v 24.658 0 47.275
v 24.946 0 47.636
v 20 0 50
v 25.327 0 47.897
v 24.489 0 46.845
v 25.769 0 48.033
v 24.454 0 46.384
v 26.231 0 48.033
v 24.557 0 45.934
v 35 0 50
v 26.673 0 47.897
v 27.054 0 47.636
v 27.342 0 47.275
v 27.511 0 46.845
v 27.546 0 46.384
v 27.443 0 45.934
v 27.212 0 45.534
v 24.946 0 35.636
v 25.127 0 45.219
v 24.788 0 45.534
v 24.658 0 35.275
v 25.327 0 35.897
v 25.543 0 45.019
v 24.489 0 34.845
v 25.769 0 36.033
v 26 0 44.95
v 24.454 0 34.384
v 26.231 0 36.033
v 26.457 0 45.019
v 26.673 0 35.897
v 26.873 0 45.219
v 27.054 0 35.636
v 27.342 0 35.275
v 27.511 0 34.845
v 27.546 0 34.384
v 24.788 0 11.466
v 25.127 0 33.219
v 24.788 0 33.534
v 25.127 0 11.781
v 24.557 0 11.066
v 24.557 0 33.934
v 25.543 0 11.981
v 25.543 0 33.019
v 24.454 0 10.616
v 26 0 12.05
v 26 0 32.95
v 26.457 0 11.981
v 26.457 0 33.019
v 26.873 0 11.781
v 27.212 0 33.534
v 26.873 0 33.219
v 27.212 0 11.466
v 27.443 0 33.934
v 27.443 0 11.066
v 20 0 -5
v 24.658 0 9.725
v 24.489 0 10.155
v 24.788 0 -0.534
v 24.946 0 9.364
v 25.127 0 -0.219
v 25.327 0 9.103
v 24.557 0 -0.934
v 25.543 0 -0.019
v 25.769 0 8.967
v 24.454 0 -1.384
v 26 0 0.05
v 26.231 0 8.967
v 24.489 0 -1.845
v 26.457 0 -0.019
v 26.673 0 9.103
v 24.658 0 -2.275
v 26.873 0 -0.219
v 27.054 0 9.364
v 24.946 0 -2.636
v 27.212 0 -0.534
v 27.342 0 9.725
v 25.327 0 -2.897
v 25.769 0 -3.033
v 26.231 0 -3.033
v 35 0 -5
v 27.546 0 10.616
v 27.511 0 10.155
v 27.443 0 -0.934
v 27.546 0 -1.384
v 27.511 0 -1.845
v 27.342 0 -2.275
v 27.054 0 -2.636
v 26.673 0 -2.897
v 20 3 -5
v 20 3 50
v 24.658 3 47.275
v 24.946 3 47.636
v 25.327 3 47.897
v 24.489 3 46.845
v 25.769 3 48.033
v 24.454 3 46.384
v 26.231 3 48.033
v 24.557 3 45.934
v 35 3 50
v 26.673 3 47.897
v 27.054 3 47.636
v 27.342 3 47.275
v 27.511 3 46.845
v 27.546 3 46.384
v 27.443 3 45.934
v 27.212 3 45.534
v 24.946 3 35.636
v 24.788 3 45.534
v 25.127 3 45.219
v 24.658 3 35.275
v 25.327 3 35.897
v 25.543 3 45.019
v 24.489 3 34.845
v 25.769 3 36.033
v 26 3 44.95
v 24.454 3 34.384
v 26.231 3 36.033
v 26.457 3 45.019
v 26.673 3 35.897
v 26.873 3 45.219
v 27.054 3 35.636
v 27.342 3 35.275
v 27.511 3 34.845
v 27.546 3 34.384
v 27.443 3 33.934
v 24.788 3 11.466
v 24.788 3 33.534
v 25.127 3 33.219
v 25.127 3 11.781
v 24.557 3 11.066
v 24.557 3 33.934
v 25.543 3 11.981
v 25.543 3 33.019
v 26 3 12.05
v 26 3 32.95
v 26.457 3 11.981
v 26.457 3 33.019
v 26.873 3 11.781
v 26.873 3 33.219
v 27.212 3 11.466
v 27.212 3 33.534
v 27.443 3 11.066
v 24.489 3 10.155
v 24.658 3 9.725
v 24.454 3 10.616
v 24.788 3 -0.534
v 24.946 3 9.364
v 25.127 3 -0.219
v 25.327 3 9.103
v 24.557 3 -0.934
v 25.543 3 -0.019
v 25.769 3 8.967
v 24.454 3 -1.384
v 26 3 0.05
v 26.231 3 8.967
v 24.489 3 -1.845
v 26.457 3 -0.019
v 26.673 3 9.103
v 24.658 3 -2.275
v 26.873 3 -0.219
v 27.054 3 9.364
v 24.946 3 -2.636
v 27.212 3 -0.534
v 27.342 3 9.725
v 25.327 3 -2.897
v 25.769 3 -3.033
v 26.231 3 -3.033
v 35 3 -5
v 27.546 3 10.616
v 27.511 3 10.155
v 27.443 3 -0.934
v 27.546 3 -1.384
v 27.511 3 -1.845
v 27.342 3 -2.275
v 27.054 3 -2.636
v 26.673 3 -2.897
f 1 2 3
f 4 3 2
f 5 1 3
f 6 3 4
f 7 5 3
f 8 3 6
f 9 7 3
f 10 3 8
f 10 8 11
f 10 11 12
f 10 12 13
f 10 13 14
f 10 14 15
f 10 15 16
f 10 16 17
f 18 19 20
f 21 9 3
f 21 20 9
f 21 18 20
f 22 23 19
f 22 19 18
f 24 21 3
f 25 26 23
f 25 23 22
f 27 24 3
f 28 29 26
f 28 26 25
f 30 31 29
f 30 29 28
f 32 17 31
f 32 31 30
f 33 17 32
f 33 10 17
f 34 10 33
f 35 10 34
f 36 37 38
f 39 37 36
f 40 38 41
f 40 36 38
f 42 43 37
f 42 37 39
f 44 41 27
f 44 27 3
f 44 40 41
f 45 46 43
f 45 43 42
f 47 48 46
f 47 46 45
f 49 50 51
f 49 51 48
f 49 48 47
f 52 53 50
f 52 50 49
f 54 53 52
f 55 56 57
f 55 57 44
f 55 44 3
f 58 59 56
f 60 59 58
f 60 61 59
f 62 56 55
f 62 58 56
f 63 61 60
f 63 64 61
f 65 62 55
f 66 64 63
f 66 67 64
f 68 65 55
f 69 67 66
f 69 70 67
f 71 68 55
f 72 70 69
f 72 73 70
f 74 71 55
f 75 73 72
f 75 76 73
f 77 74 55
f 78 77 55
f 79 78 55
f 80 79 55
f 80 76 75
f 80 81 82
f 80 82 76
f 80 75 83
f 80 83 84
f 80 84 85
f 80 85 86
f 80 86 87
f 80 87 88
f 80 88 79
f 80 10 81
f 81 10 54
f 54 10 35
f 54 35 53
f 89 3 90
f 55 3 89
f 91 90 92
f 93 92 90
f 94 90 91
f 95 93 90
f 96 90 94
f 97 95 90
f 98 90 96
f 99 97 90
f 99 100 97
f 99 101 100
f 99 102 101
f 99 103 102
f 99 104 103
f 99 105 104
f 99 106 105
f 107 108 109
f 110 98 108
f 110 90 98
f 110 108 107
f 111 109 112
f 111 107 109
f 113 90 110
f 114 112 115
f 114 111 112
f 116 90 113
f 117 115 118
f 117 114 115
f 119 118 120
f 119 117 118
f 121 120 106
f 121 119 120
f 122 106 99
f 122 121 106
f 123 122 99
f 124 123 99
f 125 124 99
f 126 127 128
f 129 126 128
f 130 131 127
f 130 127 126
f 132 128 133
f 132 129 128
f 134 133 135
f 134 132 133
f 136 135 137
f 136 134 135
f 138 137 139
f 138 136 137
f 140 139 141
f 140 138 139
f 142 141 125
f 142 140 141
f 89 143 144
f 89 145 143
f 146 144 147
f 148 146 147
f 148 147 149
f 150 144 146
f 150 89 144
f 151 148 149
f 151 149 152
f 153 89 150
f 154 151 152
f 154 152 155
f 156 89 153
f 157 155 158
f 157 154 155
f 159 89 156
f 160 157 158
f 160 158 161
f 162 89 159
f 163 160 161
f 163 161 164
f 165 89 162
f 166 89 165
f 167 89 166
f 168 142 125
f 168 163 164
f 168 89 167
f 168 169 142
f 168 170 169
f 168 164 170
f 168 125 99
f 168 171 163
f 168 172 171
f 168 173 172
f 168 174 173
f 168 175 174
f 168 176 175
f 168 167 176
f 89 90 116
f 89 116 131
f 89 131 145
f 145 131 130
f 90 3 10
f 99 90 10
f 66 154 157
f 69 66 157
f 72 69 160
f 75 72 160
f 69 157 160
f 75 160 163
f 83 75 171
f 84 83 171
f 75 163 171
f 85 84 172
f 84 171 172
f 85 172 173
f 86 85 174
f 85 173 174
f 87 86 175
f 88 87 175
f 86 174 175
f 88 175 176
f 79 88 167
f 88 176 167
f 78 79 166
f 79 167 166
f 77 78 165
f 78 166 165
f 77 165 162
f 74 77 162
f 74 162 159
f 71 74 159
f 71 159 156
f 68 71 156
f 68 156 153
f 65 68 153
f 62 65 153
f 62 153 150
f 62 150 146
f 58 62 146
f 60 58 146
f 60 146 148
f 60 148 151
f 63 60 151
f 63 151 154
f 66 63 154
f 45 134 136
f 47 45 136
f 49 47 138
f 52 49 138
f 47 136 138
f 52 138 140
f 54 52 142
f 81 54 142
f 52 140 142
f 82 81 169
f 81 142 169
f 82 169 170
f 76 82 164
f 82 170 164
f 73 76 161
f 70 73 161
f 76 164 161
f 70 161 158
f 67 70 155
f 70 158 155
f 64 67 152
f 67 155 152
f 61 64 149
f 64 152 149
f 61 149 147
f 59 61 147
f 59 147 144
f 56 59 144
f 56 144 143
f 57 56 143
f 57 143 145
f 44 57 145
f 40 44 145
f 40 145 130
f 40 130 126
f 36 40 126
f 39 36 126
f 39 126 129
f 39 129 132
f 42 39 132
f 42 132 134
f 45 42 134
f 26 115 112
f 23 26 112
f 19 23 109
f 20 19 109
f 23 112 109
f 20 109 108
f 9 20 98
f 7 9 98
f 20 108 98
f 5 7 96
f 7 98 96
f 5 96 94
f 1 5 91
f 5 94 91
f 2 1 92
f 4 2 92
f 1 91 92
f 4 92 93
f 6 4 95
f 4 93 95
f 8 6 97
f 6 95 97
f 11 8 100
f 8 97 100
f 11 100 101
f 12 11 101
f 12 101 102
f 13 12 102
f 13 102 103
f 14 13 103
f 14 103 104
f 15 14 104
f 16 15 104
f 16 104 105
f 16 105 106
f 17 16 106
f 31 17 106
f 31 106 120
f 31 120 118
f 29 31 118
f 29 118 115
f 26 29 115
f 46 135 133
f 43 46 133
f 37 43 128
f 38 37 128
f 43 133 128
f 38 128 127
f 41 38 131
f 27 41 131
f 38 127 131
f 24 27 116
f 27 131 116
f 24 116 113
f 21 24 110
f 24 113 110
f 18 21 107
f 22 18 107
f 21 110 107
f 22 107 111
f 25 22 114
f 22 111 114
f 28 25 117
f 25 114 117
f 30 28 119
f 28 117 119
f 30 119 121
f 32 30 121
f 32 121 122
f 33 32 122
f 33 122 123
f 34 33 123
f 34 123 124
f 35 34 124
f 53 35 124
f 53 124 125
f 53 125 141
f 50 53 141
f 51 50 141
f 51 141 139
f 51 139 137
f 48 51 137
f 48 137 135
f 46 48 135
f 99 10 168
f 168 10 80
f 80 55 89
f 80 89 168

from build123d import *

# Parameters (mm, degrees)
BOSS_EXTRUDE1_DEPTH = 45
SKETCH2_W           = 31
SKETCH2_H           = 37
BOSS_EXTRUDE3_START = -45
BOSS_EXTRUDE3_DEPTH = 45
SKETCH4_R           = 5.05
CUT_EXTRUDE1_DEPTH  = 12
SKETCH5_W           = 5
SKETCH5_H           = 35
CUT_EXTRUDE2_DEPTH  = 67.895440801
BOSS_EXTRUDE5_DEPTH = 37
BOSS_EXTRUDE6_START = 5
SKETCH7_W           = 17.5
SKETCH7_H           = 7.441015215
BOSS_EXTRUDE6_DEPTH = 5
SKETCH9_W           = 15
SKETCH9_H           = 55
SKETCH9_W_2         = 10
BOSS_EXTRUDE7_DEPTH = 3
SKETCH12_R          = 1.55
CUT_EXTRUDE5_DEPTH  = 5
SKETCH13_W          = 7
SKETCH13_H          = 4
CUT_EXTRUDE6_DEPTH  = 90.162772501
CUT_EXTRUDE7_DEPTH  = 74.993242935


with BuildPart() as part:
    # Sketch1 → Boss-Extrude1 (new body)
    with BuildSketch(Plane.XY):
        with BuildLine():
            Line((35, 0), (-35, 0))
            ThreePointArc((-35, 0), (0, -35), (35, 0))
        make_face()
    extrude(amount=BOSS_EXTRUDE1_DEPTH)

    # Sketch2 → Cut-Revolve1 (revolve, cut)
    with BuildSketch(Plane(origin=(0, 0, 0), x_dir=(1, 0, 0), z_dir=(0, 1, 0))):
        with Locations((-15.5, -22.5)):
            Rectangle(SKETCH2_W, SKETCH2_H)
    revolve(axis=Axis((0, 0, 0), (0, 0, 1)), mode=Mode.SUBTRACT)

    # Sketch3 → Boss-Extrude3 (add)
    with BuildSketch(Plane.XY.offset(45).offset(BOSS_EXTRUDE3_START)):
        with BuildLine():
            Line((-17.5, -30.310889132), (-17.5, 0))
            Line((-17.5, 0), (-35, 0))
            Line((-35, 0), (-35, -35))
            Line((-35, -35), (0, -35))
            ThreePointArc((0, -35), (-9.058666579, -33.80740392), (-17.5, -30.310889132))
        make_face()
    extrude(amount=BOSS_EXTRUDE3_DEPTH)

    # Sketch4 → Cut-Extrude1 (cut)
    with BuildSketch(Plane.ZY.offset(35)):
        with Locations((10, -17.5)):
            Circle(SKETCH4_R)
        with Locations((35, -17.5)):
            Circle(SKETCH4_R)
    extrude(amount=-CUT_EXTRUDE1_DEPTH, mode=Mode.SUBTRACT)

    # Sketch5 → Cut-Extrude2 (cut, through all)
    with BuildSketch(Plane(origin=(0, 0, 0), x_dir=(-1, 0, 0), z_dir=(0, 0, -1))):
        with Locations((32.5, -17.5)):
            Rectangle(SKETCH5_W, SKETCH5_H)
    extrude(amount=-CUT_EXTRUDE2_DEPTH, mode=Mode.SUBTRACT)

    # Sketch6 → Boss-Extrude5 (add)
    with BuildSketch(Plane(origin=(0, 0, 41), x_dir=(-1, 0, 0), z_dir=(0, 0, -1))):
        with BuildLine():
            ThreePointArc((-31, 0), (-25.966324345, -16.933694222), (-12.5, -28.368115905))
            Line((-12.5, -28.368115905), (-12.5, 0))
            Line((-12.5, 0), (-31, 0))
        make_face()
        with BuildLine():
            Line((12.5, 0), (12.5, -28.368115905))
            ThreePointArc((12.5, -28.368115905), (15.064267175, -27.093686617), (17.5, -25.588083164))
            Line((17.5, -25.588083164), (17.5, 0))
            Line((17.5, 0), (12.5, 0))
        make_face()
    extrude(amount=BOSS_EXTRUDE5_DEPTH)

    # Sketch7 → Boss-Extrude6 (add)
    with BuildSketch(Plane(origin=(0, 0, 0), x_dir=(-1, 0, 0), z_dir=(0, 0, -1)).offset(BOSS_EXTRUDE6_START)):
        with BuildLine():
            Line((-12.5, 0), (-35, 0))
            ThreePointArc((-35, 0), (-34.799393274, -3.741955075), (-34.199872698, -7.441015215))
            Line((-34.199872698, -7.441015215), (-12.5, -7.441015215))
            Line((-12.5, -7.441015215), (-12.5, 0))
        make_face()
        with Locations((21.25, -3.720507608)):
            Rectangle(SKETCH7_W, SKETCH7_H)
    boss_extrude6 = extrude(amount=-BOSS_EXTRUDE6_DEPTH)

    # Mirror1: Boss-Extrude6 across plane
    add(boss_extrude6.mirror(Plane(origin=(0, 0, 22.5), x_dir=(1, 0, 0), z_dir=(0, 0, -1))))

    # Sketch9 → Boss-Extrude7 (add)
    with BuildSketch(Plane(origin=(0, 0, 0), x_dir=(1, 0, 0), z_dir=(0, 1, 0))):
        with Locations((27.5, -22.5)):
            Rectangle(SKETCH9_W, SKETCH9_H)
        with Locations((-25, -22.5)):
            Rectangle(SKETCH9_W_2, SKETCH9_H)
    extrude(amount=BOSS_EXTRUDE7_DEPTH)

    # Sketch12 → Cut-Extrude5 (cut)
    with BuildSketch(Plane(origin=(0, 3, 0), x_dir=(1, 0, 0), z_dir=(0, 1, 0))):
        with Locations((26, 1.5)):
            Circle(SKETCH12_R)
        with Locations((26, -10.5)):
            Circle(SKETCH12_R)
        with Locations((26, -34.5)):
            Circle(SKETCH12_R)
        with Locations((26, -46.5)):
            Circle(SKETCH12_R)
        with Locations((-26, 1.5)):
            Circle(SKETCH12_R)
        with Locations((-26, -10.5)):
            Circle(SKETCH12_R)
        with Locations((-26, -34.5)):
            Circle(SKETCH12_R)
        with Locations((-26, -46.5)):
            Circle(SKETCH12_R)
    extrude(amount=-CUT_EXTRUDE5_DEPTH, mode=Mode.SUBTRACT)

    # Sketch13 → Cut-Extrude6 (cut, through all)
    with BuildSketch(Plane(origin=(35, 0, 0), x_dir=(0, 0, -1), z_dir=(1, 0, 0))):
        with Locations((-46.5, -2)):
            Rectangle(SKETCH13_W, SKETCH13_H)
        with Locations((-34.5, -2)):
            Rectangle(SKETCH13_W, SKETCH13_H)
        with Locations((-10.5, -2)):
            Rectangle(SKETCH13_W, SKETCH13_H)
        with Locations((1.5, -2)):
            Rectangle(SKETCH13_W, SKETCH13_H)
    extrude(amount=-CUT_EXTRUDE6_DEPTH, mode=Mode.SUBTRACT)

    # Sketch14 → Cut-Extrude7 (cut, through all)
    with BuildSketch(Plane.XY.offset(50)):
        Polygon((-17.094187338, 0), (35.300582727, 0), (35.300582727, -35.487417881), (-30, -35.487417881), (-30, 0), (-30, 9.051842105), (-17.094187338, 9.051842105), align=None)
    extrude(amount=-CUT_EXTRUDE7_DEPTH, mode=Mode.SUBTRACT)


solid = part.part
